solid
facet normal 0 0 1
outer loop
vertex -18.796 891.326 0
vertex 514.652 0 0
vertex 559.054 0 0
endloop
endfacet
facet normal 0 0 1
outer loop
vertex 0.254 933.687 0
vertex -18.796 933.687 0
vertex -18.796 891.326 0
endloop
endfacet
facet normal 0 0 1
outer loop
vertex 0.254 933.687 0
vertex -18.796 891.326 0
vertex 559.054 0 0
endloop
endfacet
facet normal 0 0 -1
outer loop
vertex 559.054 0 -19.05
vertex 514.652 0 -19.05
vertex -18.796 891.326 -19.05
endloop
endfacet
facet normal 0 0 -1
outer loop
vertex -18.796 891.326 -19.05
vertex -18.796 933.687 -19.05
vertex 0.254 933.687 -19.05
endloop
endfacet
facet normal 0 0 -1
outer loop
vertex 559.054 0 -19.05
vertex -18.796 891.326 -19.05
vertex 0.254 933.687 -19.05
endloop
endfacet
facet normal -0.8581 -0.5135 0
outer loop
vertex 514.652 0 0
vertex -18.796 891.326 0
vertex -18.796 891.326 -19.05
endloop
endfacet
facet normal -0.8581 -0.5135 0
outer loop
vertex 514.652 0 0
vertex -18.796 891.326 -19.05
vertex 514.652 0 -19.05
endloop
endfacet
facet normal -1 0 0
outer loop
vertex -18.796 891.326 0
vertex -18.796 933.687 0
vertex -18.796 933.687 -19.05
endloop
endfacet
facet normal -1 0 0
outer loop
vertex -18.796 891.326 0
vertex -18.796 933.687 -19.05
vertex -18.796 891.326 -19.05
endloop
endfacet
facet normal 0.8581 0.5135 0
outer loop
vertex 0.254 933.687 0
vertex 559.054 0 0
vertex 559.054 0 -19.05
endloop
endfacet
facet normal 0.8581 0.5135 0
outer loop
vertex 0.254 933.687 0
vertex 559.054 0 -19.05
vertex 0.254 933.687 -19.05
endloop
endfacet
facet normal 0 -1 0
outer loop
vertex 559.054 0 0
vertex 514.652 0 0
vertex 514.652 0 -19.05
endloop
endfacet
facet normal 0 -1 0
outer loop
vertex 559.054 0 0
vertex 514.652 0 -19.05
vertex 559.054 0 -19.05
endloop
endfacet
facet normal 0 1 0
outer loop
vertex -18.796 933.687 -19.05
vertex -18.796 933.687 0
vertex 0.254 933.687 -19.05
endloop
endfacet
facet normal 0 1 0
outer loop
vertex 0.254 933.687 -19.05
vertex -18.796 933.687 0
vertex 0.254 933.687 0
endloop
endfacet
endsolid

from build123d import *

# Parameters (mm, degrees)
BOSS_EXTRUDE1_DEPTH = 19.05
CUT_EXTRUDE1_DEPTH  = 20.05


with BuildPart() as part:
    # Sketch1 → Boss-Extrude1 (new body)
    with BuildSketch(Plane.XY):
        Polygon((559.054, 0), (-18.796, 965.516993591), (-18.796, 891.326264322), (514.651764521, 0), align=None)
    extrude(amount=-BOSS_EXTRUDE1_DEPTH)

    # Sketch2 → Cut-Extrude1 (cut, through all)
    with BuildSketch(Plane.XY):
        Polygon((-18.796, 965.516993591), (-18.796, 933.686763034), (0.254, 933.686763034), align=None)
    extrude(amount=-CUT_EXTRUDE1_DEPTH, mode=Mode.SUBTRACT)


solid = part.part
